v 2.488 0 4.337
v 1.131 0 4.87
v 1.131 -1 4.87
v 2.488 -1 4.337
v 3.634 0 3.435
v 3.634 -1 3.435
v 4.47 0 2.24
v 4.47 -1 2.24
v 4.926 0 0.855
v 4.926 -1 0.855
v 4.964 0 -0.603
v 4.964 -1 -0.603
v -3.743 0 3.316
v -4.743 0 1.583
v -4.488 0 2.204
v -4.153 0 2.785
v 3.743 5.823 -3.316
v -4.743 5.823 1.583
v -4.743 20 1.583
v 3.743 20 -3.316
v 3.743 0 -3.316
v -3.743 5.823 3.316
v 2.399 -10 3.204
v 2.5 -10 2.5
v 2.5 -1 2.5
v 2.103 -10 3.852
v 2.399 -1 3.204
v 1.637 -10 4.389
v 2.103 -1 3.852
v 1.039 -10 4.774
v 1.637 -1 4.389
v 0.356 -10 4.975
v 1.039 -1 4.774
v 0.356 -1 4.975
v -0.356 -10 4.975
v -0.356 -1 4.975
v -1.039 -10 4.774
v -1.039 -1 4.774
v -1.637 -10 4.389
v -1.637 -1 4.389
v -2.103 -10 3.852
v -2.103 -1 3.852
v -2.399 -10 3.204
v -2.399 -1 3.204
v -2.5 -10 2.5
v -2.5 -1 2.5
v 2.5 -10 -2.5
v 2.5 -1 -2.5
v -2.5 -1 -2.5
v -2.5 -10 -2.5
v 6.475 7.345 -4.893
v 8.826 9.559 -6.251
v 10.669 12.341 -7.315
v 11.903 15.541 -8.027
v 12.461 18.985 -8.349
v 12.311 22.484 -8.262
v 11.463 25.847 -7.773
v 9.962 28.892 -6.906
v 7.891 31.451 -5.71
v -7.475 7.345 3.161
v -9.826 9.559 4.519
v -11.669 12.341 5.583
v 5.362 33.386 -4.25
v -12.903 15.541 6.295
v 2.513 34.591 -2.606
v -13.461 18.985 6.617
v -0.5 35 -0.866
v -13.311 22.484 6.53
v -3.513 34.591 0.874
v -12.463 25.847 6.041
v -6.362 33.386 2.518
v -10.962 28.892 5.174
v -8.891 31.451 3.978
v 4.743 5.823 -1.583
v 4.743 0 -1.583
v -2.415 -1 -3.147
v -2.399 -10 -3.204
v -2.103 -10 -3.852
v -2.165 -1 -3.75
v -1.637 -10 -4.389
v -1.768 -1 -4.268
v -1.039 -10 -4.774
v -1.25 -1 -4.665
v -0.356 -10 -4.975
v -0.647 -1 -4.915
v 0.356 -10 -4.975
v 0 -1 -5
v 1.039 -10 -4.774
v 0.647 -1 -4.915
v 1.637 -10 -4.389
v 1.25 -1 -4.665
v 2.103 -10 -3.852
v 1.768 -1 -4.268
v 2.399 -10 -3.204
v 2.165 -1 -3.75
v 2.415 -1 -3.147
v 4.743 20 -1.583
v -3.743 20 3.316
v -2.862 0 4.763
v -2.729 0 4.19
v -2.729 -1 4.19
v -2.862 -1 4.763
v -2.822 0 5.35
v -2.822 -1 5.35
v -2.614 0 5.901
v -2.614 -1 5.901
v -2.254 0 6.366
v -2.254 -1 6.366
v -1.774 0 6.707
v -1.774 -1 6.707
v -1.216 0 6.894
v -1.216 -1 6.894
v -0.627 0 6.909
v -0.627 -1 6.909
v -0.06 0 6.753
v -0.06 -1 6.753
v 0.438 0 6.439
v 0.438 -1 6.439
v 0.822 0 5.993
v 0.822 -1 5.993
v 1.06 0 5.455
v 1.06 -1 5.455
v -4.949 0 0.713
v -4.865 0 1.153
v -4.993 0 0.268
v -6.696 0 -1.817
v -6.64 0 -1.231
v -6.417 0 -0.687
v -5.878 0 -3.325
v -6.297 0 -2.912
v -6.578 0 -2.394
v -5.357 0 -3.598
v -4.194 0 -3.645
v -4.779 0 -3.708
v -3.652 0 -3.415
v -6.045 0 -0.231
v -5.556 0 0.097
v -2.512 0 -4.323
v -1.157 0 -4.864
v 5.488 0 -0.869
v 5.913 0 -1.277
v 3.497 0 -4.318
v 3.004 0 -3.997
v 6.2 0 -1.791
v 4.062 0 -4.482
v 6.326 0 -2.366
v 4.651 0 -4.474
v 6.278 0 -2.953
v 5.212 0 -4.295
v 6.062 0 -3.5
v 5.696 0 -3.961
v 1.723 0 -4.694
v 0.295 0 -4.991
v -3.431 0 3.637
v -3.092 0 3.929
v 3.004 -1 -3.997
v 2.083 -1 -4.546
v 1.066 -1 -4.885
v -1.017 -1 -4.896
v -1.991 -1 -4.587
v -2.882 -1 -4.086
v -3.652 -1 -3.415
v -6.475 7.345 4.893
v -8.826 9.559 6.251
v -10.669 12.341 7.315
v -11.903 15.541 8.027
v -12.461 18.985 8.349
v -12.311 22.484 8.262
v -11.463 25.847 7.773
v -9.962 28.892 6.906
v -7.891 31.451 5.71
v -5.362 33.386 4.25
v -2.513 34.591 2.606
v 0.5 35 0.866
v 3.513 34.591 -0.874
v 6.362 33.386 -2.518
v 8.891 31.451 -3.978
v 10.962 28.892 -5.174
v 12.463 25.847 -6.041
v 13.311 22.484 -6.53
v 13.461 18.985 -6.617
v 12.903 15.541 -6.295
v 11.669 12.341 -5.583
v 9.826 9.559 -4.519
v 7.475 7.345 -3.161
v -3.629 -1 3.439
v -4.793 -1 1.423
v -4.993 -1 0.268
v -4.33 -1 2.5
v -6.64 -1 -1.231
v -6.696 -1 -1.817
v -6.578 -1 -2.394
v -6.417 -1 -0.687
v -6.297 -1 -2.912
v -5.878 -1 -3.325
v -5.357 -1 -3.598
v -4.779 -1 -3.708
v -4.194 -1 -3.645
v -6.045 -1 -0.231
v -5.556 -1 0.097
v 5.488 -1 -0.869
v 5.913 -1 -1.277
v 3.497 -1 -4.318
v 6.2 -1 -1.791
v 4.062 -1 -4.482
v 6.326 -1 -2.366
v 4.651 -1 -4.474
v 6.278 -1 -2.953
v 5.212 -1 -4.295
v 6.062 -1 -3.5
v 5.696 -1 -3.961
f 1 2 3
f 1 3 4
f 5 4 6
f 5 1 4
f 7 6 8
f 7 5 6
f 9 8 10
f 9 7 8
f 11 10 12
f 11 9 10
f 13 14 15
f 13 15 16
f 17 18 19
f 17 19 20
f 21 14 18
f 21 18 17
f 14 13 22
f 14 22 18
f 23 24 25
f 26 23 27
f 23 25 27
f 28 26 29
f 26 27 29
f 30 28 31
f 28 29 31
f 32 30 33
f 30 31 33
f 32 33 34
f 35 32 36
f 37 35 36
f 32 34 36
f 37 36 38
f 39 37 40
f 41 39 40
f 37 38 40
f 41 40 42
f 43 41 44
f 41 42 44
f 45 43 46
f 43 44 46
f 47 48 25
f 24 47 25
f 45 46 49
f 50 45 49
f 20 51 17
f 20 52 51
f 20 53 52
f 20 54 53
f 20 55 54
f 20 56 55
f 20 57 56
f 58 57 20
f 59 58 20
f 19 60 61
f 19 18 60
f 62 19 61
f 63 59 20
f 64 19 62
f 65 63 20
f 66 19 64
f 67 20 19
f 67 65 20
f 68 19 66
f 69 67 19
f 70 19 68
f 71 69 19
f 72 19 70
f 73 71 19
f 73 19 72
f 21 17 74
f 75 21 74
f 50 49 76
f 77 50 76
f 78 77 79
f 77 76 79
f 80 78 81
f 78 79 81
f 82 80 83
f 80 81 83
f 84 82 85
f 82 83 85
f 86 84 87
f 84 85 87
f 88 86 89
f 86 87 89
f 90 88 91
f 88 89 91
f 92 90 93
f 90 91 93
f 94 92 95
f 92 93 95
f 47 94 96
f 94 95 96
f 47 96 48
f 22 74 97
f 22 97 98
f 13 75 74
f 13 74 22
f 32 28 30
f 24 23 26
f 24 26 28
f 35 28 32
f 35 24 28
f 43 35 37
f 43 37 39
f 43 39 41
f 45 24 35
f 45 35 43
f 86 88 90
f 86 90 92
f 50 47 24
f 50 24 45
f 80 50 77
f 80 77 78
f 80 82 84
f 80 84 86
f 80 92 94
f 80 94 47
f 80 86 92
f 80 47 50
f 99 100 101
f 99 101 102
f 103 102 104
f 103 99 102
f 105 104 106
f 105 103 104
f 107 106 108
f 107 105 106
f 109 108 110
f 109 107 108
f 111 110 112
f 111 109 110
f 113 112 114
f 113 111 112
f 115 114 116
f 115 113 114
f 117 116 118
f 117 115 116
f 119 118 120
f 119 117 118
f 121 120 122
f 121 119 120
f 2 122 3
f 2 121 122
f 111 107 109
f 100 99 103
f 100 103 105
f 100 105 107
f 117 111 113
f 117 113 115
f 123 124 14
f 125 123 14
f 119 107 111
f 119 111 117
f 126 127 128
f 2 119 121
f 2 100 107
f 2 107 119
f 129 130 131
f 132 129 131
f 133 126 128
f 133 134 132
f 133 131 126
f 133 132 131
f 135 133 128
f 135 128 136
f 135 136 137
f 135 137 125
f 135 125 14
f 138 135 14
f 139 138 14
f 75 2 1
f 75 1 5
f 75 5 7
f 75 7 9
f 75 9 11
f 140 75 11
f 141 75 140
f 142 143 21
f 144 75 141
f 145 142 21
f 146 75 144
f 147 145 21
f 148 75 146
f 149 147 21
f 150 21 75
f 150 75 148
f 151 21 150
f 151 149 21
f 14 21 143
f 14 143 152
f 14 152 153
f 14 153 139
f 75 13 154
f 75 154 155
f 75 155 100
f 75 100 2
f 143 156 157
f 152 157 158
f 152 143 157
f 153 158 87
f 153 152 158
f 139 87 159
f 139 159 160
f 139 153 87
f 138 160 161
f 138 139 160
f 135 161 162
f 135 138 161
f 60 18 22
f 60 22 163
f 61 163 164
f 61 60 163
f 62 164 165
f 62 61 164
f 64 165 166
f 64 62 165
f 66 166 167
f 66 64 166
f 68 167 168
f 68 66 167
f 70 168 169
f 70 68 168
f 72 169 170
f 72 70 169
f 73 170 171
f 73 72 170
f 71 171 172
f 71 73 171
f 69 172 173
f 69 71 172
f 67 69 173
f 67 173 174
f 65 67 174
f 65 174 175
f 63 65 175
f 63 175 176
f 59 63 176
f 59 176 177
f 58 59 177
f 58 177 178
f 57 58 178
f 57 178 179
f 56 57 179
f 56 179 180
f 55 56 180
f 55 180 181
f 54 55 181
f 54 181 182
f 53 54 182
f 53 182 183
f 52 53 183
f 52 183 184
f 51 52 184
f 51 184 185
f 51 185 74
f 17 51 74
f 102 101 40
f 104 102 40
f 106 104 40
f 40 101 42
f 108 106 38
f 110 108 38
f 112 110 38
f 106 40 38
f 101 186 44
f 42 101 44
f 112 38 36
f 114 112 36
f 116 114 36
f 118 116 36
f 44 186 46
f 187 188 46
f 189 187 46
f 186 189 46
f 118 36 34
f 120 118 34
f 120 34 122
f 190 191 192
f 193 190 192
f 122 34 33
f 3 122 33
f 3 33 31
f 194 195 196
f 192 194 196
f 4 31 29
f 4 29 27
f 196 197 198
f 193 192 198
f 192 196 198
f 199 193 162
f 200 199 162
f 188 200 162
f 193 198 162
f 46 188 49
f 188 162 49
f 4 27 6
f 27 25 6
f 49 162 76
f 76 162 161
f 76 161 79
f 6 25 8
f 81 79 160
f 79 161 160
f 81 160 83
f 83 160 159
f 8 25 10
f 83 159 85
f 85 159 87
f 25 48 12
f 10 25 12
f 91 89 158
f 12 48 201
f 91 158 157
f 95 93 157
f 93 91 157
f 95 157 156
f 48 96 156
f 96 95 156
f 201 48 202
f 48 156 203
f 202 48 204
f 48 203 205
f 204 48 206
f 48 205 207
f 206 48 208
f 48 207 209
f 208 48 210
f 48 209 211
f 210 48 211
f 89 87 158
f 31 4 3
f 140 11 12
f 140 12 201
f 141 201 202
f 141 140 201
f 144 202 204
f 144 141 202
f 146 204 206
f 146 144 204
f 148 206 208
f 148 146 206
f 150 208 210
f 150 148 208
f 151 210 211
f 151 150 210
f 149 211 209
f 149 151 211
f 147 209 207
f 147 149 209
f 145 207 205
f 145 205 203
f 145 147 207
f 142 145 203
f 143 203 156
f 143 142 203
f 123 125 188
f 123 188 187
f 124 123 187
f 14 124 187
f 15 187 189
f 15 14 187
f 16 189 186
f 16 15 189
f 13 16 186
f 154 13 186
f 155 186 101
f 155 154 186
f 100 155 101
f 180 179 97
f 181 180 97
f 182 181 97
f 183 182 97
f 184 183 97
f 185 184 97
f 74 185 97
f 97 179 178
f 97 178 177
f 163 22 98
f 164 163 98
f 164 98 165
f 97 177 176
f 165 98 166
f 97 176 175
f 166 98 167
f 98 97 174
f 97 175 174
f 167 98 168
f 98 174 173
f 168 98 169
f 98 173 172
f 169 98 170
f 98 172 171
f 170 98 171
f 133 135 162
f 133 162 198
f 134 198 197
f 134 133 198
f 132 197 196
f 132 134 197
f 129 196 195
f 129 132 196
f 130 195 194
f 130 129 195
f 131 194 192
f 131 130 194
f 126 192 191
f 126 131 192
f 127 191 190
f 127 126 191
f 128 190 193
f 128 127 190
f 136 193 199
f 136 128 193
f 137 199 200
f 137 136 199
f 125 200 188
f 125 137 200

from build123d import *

# Parameters (mm, degrees)
BOSS_EXTRUDE1_DEPTH = 10
BOSS_EXTRUDE2_DEPTH = 1
BOSS_EXTRUDE3_DEPTH = 20
SKETCH2_R           = 15
BOSS_EXTRUDE4_DEPTH = 2


with BuildPart() as part:
    # Sketch1 → Boss-Extrude1 (new body)
    with BuildSketch(Plane(origin=(0, 0, 0), x_dir=(1, 0, 0), z_dir=(0, 1, 0))):
        with BuildLine():
            Line((2.5, 2.5), (2.5, -2.5))
            ThreePointArc((2.5, -2.5), (0, -5), (-2.5, -2.5))
            Line((-2.5, -2.5), (-2.5, 2.5))
            ThreePointArc((-2.5, 2.5), (0, 5), (2.5, 2.5))
        make_face()
    extrude(amount=-BOSS_EXTRUDE1_DEPTH)

    # Sketch1<3> → Boss-Extrude2 (add)
    with BuildSketch(Plane(origin=(0, 0, 0), x_dir=(1, 0, 0), z_dir=(0, 1, 0))):
        with BuildLine():
            ThreePointArc((3.00392096, 3.997056275), (-0.435778714, 4.98097349), (-3.652366189, 3.414706608))
            ThreePointArc((-3.652366189, 3.414706608), (-6.577848346, 2.394141003), (-4.992805922, -0.268121289))
            ThreePointArc((-4.992805922, -0.268121289), (-4.330127019, -2.5), (-2.728602809, -4.18983612))
            ThreePointArc((-2.728602809, -4.18983612), (-1.215537244, -6.893654271), (1.131039574, -4.870395208))
            ThreePointArc((1.131039574, -4.870395208), (4.095760221, -2.867882182), (4.963512755, 0.602943725))
            ThreePointArc((4.963512755, 0.602943725), (6.062177826, 3.5), (3.00392096, 3.997056275))
        make_face()
    extrude(amount=-BOSS_EXTRUDE2_DEPTH)

    # Sketch1<5> → Boss-Extrude3 (add)
    with BuildSketch(Plane(origin=(0, 0, 0), x_dir=(1, 0, 0), z_dir=(0, 1, 0))):
        Polygon((3.742640687, 3.315515147), (4.742640687, 1.583464339), (-3.742640687, -3.315515147), (-4.742640687, -1.583464339), align=None)
    extrude(amount=BOSS_EXTRUDE3_DEPTH)

    # Sketch2 → Boss-Extrude4 (add)
    with BuildSketch(Plane(origin=(-0.500000000000002, 0, -0.8660254037844417), x_dir=(-0.8660254037844386, 0, 0.5000000000000002), z_dir=(-0.5000000000000001, 0, -0.8660254037844385))):
        with Locations((0, 20)):
            Circle(SKETCH2_R)
    extrude(amount=-BOSS_EXTRUDE4_DEPTH)


solid = part.part
